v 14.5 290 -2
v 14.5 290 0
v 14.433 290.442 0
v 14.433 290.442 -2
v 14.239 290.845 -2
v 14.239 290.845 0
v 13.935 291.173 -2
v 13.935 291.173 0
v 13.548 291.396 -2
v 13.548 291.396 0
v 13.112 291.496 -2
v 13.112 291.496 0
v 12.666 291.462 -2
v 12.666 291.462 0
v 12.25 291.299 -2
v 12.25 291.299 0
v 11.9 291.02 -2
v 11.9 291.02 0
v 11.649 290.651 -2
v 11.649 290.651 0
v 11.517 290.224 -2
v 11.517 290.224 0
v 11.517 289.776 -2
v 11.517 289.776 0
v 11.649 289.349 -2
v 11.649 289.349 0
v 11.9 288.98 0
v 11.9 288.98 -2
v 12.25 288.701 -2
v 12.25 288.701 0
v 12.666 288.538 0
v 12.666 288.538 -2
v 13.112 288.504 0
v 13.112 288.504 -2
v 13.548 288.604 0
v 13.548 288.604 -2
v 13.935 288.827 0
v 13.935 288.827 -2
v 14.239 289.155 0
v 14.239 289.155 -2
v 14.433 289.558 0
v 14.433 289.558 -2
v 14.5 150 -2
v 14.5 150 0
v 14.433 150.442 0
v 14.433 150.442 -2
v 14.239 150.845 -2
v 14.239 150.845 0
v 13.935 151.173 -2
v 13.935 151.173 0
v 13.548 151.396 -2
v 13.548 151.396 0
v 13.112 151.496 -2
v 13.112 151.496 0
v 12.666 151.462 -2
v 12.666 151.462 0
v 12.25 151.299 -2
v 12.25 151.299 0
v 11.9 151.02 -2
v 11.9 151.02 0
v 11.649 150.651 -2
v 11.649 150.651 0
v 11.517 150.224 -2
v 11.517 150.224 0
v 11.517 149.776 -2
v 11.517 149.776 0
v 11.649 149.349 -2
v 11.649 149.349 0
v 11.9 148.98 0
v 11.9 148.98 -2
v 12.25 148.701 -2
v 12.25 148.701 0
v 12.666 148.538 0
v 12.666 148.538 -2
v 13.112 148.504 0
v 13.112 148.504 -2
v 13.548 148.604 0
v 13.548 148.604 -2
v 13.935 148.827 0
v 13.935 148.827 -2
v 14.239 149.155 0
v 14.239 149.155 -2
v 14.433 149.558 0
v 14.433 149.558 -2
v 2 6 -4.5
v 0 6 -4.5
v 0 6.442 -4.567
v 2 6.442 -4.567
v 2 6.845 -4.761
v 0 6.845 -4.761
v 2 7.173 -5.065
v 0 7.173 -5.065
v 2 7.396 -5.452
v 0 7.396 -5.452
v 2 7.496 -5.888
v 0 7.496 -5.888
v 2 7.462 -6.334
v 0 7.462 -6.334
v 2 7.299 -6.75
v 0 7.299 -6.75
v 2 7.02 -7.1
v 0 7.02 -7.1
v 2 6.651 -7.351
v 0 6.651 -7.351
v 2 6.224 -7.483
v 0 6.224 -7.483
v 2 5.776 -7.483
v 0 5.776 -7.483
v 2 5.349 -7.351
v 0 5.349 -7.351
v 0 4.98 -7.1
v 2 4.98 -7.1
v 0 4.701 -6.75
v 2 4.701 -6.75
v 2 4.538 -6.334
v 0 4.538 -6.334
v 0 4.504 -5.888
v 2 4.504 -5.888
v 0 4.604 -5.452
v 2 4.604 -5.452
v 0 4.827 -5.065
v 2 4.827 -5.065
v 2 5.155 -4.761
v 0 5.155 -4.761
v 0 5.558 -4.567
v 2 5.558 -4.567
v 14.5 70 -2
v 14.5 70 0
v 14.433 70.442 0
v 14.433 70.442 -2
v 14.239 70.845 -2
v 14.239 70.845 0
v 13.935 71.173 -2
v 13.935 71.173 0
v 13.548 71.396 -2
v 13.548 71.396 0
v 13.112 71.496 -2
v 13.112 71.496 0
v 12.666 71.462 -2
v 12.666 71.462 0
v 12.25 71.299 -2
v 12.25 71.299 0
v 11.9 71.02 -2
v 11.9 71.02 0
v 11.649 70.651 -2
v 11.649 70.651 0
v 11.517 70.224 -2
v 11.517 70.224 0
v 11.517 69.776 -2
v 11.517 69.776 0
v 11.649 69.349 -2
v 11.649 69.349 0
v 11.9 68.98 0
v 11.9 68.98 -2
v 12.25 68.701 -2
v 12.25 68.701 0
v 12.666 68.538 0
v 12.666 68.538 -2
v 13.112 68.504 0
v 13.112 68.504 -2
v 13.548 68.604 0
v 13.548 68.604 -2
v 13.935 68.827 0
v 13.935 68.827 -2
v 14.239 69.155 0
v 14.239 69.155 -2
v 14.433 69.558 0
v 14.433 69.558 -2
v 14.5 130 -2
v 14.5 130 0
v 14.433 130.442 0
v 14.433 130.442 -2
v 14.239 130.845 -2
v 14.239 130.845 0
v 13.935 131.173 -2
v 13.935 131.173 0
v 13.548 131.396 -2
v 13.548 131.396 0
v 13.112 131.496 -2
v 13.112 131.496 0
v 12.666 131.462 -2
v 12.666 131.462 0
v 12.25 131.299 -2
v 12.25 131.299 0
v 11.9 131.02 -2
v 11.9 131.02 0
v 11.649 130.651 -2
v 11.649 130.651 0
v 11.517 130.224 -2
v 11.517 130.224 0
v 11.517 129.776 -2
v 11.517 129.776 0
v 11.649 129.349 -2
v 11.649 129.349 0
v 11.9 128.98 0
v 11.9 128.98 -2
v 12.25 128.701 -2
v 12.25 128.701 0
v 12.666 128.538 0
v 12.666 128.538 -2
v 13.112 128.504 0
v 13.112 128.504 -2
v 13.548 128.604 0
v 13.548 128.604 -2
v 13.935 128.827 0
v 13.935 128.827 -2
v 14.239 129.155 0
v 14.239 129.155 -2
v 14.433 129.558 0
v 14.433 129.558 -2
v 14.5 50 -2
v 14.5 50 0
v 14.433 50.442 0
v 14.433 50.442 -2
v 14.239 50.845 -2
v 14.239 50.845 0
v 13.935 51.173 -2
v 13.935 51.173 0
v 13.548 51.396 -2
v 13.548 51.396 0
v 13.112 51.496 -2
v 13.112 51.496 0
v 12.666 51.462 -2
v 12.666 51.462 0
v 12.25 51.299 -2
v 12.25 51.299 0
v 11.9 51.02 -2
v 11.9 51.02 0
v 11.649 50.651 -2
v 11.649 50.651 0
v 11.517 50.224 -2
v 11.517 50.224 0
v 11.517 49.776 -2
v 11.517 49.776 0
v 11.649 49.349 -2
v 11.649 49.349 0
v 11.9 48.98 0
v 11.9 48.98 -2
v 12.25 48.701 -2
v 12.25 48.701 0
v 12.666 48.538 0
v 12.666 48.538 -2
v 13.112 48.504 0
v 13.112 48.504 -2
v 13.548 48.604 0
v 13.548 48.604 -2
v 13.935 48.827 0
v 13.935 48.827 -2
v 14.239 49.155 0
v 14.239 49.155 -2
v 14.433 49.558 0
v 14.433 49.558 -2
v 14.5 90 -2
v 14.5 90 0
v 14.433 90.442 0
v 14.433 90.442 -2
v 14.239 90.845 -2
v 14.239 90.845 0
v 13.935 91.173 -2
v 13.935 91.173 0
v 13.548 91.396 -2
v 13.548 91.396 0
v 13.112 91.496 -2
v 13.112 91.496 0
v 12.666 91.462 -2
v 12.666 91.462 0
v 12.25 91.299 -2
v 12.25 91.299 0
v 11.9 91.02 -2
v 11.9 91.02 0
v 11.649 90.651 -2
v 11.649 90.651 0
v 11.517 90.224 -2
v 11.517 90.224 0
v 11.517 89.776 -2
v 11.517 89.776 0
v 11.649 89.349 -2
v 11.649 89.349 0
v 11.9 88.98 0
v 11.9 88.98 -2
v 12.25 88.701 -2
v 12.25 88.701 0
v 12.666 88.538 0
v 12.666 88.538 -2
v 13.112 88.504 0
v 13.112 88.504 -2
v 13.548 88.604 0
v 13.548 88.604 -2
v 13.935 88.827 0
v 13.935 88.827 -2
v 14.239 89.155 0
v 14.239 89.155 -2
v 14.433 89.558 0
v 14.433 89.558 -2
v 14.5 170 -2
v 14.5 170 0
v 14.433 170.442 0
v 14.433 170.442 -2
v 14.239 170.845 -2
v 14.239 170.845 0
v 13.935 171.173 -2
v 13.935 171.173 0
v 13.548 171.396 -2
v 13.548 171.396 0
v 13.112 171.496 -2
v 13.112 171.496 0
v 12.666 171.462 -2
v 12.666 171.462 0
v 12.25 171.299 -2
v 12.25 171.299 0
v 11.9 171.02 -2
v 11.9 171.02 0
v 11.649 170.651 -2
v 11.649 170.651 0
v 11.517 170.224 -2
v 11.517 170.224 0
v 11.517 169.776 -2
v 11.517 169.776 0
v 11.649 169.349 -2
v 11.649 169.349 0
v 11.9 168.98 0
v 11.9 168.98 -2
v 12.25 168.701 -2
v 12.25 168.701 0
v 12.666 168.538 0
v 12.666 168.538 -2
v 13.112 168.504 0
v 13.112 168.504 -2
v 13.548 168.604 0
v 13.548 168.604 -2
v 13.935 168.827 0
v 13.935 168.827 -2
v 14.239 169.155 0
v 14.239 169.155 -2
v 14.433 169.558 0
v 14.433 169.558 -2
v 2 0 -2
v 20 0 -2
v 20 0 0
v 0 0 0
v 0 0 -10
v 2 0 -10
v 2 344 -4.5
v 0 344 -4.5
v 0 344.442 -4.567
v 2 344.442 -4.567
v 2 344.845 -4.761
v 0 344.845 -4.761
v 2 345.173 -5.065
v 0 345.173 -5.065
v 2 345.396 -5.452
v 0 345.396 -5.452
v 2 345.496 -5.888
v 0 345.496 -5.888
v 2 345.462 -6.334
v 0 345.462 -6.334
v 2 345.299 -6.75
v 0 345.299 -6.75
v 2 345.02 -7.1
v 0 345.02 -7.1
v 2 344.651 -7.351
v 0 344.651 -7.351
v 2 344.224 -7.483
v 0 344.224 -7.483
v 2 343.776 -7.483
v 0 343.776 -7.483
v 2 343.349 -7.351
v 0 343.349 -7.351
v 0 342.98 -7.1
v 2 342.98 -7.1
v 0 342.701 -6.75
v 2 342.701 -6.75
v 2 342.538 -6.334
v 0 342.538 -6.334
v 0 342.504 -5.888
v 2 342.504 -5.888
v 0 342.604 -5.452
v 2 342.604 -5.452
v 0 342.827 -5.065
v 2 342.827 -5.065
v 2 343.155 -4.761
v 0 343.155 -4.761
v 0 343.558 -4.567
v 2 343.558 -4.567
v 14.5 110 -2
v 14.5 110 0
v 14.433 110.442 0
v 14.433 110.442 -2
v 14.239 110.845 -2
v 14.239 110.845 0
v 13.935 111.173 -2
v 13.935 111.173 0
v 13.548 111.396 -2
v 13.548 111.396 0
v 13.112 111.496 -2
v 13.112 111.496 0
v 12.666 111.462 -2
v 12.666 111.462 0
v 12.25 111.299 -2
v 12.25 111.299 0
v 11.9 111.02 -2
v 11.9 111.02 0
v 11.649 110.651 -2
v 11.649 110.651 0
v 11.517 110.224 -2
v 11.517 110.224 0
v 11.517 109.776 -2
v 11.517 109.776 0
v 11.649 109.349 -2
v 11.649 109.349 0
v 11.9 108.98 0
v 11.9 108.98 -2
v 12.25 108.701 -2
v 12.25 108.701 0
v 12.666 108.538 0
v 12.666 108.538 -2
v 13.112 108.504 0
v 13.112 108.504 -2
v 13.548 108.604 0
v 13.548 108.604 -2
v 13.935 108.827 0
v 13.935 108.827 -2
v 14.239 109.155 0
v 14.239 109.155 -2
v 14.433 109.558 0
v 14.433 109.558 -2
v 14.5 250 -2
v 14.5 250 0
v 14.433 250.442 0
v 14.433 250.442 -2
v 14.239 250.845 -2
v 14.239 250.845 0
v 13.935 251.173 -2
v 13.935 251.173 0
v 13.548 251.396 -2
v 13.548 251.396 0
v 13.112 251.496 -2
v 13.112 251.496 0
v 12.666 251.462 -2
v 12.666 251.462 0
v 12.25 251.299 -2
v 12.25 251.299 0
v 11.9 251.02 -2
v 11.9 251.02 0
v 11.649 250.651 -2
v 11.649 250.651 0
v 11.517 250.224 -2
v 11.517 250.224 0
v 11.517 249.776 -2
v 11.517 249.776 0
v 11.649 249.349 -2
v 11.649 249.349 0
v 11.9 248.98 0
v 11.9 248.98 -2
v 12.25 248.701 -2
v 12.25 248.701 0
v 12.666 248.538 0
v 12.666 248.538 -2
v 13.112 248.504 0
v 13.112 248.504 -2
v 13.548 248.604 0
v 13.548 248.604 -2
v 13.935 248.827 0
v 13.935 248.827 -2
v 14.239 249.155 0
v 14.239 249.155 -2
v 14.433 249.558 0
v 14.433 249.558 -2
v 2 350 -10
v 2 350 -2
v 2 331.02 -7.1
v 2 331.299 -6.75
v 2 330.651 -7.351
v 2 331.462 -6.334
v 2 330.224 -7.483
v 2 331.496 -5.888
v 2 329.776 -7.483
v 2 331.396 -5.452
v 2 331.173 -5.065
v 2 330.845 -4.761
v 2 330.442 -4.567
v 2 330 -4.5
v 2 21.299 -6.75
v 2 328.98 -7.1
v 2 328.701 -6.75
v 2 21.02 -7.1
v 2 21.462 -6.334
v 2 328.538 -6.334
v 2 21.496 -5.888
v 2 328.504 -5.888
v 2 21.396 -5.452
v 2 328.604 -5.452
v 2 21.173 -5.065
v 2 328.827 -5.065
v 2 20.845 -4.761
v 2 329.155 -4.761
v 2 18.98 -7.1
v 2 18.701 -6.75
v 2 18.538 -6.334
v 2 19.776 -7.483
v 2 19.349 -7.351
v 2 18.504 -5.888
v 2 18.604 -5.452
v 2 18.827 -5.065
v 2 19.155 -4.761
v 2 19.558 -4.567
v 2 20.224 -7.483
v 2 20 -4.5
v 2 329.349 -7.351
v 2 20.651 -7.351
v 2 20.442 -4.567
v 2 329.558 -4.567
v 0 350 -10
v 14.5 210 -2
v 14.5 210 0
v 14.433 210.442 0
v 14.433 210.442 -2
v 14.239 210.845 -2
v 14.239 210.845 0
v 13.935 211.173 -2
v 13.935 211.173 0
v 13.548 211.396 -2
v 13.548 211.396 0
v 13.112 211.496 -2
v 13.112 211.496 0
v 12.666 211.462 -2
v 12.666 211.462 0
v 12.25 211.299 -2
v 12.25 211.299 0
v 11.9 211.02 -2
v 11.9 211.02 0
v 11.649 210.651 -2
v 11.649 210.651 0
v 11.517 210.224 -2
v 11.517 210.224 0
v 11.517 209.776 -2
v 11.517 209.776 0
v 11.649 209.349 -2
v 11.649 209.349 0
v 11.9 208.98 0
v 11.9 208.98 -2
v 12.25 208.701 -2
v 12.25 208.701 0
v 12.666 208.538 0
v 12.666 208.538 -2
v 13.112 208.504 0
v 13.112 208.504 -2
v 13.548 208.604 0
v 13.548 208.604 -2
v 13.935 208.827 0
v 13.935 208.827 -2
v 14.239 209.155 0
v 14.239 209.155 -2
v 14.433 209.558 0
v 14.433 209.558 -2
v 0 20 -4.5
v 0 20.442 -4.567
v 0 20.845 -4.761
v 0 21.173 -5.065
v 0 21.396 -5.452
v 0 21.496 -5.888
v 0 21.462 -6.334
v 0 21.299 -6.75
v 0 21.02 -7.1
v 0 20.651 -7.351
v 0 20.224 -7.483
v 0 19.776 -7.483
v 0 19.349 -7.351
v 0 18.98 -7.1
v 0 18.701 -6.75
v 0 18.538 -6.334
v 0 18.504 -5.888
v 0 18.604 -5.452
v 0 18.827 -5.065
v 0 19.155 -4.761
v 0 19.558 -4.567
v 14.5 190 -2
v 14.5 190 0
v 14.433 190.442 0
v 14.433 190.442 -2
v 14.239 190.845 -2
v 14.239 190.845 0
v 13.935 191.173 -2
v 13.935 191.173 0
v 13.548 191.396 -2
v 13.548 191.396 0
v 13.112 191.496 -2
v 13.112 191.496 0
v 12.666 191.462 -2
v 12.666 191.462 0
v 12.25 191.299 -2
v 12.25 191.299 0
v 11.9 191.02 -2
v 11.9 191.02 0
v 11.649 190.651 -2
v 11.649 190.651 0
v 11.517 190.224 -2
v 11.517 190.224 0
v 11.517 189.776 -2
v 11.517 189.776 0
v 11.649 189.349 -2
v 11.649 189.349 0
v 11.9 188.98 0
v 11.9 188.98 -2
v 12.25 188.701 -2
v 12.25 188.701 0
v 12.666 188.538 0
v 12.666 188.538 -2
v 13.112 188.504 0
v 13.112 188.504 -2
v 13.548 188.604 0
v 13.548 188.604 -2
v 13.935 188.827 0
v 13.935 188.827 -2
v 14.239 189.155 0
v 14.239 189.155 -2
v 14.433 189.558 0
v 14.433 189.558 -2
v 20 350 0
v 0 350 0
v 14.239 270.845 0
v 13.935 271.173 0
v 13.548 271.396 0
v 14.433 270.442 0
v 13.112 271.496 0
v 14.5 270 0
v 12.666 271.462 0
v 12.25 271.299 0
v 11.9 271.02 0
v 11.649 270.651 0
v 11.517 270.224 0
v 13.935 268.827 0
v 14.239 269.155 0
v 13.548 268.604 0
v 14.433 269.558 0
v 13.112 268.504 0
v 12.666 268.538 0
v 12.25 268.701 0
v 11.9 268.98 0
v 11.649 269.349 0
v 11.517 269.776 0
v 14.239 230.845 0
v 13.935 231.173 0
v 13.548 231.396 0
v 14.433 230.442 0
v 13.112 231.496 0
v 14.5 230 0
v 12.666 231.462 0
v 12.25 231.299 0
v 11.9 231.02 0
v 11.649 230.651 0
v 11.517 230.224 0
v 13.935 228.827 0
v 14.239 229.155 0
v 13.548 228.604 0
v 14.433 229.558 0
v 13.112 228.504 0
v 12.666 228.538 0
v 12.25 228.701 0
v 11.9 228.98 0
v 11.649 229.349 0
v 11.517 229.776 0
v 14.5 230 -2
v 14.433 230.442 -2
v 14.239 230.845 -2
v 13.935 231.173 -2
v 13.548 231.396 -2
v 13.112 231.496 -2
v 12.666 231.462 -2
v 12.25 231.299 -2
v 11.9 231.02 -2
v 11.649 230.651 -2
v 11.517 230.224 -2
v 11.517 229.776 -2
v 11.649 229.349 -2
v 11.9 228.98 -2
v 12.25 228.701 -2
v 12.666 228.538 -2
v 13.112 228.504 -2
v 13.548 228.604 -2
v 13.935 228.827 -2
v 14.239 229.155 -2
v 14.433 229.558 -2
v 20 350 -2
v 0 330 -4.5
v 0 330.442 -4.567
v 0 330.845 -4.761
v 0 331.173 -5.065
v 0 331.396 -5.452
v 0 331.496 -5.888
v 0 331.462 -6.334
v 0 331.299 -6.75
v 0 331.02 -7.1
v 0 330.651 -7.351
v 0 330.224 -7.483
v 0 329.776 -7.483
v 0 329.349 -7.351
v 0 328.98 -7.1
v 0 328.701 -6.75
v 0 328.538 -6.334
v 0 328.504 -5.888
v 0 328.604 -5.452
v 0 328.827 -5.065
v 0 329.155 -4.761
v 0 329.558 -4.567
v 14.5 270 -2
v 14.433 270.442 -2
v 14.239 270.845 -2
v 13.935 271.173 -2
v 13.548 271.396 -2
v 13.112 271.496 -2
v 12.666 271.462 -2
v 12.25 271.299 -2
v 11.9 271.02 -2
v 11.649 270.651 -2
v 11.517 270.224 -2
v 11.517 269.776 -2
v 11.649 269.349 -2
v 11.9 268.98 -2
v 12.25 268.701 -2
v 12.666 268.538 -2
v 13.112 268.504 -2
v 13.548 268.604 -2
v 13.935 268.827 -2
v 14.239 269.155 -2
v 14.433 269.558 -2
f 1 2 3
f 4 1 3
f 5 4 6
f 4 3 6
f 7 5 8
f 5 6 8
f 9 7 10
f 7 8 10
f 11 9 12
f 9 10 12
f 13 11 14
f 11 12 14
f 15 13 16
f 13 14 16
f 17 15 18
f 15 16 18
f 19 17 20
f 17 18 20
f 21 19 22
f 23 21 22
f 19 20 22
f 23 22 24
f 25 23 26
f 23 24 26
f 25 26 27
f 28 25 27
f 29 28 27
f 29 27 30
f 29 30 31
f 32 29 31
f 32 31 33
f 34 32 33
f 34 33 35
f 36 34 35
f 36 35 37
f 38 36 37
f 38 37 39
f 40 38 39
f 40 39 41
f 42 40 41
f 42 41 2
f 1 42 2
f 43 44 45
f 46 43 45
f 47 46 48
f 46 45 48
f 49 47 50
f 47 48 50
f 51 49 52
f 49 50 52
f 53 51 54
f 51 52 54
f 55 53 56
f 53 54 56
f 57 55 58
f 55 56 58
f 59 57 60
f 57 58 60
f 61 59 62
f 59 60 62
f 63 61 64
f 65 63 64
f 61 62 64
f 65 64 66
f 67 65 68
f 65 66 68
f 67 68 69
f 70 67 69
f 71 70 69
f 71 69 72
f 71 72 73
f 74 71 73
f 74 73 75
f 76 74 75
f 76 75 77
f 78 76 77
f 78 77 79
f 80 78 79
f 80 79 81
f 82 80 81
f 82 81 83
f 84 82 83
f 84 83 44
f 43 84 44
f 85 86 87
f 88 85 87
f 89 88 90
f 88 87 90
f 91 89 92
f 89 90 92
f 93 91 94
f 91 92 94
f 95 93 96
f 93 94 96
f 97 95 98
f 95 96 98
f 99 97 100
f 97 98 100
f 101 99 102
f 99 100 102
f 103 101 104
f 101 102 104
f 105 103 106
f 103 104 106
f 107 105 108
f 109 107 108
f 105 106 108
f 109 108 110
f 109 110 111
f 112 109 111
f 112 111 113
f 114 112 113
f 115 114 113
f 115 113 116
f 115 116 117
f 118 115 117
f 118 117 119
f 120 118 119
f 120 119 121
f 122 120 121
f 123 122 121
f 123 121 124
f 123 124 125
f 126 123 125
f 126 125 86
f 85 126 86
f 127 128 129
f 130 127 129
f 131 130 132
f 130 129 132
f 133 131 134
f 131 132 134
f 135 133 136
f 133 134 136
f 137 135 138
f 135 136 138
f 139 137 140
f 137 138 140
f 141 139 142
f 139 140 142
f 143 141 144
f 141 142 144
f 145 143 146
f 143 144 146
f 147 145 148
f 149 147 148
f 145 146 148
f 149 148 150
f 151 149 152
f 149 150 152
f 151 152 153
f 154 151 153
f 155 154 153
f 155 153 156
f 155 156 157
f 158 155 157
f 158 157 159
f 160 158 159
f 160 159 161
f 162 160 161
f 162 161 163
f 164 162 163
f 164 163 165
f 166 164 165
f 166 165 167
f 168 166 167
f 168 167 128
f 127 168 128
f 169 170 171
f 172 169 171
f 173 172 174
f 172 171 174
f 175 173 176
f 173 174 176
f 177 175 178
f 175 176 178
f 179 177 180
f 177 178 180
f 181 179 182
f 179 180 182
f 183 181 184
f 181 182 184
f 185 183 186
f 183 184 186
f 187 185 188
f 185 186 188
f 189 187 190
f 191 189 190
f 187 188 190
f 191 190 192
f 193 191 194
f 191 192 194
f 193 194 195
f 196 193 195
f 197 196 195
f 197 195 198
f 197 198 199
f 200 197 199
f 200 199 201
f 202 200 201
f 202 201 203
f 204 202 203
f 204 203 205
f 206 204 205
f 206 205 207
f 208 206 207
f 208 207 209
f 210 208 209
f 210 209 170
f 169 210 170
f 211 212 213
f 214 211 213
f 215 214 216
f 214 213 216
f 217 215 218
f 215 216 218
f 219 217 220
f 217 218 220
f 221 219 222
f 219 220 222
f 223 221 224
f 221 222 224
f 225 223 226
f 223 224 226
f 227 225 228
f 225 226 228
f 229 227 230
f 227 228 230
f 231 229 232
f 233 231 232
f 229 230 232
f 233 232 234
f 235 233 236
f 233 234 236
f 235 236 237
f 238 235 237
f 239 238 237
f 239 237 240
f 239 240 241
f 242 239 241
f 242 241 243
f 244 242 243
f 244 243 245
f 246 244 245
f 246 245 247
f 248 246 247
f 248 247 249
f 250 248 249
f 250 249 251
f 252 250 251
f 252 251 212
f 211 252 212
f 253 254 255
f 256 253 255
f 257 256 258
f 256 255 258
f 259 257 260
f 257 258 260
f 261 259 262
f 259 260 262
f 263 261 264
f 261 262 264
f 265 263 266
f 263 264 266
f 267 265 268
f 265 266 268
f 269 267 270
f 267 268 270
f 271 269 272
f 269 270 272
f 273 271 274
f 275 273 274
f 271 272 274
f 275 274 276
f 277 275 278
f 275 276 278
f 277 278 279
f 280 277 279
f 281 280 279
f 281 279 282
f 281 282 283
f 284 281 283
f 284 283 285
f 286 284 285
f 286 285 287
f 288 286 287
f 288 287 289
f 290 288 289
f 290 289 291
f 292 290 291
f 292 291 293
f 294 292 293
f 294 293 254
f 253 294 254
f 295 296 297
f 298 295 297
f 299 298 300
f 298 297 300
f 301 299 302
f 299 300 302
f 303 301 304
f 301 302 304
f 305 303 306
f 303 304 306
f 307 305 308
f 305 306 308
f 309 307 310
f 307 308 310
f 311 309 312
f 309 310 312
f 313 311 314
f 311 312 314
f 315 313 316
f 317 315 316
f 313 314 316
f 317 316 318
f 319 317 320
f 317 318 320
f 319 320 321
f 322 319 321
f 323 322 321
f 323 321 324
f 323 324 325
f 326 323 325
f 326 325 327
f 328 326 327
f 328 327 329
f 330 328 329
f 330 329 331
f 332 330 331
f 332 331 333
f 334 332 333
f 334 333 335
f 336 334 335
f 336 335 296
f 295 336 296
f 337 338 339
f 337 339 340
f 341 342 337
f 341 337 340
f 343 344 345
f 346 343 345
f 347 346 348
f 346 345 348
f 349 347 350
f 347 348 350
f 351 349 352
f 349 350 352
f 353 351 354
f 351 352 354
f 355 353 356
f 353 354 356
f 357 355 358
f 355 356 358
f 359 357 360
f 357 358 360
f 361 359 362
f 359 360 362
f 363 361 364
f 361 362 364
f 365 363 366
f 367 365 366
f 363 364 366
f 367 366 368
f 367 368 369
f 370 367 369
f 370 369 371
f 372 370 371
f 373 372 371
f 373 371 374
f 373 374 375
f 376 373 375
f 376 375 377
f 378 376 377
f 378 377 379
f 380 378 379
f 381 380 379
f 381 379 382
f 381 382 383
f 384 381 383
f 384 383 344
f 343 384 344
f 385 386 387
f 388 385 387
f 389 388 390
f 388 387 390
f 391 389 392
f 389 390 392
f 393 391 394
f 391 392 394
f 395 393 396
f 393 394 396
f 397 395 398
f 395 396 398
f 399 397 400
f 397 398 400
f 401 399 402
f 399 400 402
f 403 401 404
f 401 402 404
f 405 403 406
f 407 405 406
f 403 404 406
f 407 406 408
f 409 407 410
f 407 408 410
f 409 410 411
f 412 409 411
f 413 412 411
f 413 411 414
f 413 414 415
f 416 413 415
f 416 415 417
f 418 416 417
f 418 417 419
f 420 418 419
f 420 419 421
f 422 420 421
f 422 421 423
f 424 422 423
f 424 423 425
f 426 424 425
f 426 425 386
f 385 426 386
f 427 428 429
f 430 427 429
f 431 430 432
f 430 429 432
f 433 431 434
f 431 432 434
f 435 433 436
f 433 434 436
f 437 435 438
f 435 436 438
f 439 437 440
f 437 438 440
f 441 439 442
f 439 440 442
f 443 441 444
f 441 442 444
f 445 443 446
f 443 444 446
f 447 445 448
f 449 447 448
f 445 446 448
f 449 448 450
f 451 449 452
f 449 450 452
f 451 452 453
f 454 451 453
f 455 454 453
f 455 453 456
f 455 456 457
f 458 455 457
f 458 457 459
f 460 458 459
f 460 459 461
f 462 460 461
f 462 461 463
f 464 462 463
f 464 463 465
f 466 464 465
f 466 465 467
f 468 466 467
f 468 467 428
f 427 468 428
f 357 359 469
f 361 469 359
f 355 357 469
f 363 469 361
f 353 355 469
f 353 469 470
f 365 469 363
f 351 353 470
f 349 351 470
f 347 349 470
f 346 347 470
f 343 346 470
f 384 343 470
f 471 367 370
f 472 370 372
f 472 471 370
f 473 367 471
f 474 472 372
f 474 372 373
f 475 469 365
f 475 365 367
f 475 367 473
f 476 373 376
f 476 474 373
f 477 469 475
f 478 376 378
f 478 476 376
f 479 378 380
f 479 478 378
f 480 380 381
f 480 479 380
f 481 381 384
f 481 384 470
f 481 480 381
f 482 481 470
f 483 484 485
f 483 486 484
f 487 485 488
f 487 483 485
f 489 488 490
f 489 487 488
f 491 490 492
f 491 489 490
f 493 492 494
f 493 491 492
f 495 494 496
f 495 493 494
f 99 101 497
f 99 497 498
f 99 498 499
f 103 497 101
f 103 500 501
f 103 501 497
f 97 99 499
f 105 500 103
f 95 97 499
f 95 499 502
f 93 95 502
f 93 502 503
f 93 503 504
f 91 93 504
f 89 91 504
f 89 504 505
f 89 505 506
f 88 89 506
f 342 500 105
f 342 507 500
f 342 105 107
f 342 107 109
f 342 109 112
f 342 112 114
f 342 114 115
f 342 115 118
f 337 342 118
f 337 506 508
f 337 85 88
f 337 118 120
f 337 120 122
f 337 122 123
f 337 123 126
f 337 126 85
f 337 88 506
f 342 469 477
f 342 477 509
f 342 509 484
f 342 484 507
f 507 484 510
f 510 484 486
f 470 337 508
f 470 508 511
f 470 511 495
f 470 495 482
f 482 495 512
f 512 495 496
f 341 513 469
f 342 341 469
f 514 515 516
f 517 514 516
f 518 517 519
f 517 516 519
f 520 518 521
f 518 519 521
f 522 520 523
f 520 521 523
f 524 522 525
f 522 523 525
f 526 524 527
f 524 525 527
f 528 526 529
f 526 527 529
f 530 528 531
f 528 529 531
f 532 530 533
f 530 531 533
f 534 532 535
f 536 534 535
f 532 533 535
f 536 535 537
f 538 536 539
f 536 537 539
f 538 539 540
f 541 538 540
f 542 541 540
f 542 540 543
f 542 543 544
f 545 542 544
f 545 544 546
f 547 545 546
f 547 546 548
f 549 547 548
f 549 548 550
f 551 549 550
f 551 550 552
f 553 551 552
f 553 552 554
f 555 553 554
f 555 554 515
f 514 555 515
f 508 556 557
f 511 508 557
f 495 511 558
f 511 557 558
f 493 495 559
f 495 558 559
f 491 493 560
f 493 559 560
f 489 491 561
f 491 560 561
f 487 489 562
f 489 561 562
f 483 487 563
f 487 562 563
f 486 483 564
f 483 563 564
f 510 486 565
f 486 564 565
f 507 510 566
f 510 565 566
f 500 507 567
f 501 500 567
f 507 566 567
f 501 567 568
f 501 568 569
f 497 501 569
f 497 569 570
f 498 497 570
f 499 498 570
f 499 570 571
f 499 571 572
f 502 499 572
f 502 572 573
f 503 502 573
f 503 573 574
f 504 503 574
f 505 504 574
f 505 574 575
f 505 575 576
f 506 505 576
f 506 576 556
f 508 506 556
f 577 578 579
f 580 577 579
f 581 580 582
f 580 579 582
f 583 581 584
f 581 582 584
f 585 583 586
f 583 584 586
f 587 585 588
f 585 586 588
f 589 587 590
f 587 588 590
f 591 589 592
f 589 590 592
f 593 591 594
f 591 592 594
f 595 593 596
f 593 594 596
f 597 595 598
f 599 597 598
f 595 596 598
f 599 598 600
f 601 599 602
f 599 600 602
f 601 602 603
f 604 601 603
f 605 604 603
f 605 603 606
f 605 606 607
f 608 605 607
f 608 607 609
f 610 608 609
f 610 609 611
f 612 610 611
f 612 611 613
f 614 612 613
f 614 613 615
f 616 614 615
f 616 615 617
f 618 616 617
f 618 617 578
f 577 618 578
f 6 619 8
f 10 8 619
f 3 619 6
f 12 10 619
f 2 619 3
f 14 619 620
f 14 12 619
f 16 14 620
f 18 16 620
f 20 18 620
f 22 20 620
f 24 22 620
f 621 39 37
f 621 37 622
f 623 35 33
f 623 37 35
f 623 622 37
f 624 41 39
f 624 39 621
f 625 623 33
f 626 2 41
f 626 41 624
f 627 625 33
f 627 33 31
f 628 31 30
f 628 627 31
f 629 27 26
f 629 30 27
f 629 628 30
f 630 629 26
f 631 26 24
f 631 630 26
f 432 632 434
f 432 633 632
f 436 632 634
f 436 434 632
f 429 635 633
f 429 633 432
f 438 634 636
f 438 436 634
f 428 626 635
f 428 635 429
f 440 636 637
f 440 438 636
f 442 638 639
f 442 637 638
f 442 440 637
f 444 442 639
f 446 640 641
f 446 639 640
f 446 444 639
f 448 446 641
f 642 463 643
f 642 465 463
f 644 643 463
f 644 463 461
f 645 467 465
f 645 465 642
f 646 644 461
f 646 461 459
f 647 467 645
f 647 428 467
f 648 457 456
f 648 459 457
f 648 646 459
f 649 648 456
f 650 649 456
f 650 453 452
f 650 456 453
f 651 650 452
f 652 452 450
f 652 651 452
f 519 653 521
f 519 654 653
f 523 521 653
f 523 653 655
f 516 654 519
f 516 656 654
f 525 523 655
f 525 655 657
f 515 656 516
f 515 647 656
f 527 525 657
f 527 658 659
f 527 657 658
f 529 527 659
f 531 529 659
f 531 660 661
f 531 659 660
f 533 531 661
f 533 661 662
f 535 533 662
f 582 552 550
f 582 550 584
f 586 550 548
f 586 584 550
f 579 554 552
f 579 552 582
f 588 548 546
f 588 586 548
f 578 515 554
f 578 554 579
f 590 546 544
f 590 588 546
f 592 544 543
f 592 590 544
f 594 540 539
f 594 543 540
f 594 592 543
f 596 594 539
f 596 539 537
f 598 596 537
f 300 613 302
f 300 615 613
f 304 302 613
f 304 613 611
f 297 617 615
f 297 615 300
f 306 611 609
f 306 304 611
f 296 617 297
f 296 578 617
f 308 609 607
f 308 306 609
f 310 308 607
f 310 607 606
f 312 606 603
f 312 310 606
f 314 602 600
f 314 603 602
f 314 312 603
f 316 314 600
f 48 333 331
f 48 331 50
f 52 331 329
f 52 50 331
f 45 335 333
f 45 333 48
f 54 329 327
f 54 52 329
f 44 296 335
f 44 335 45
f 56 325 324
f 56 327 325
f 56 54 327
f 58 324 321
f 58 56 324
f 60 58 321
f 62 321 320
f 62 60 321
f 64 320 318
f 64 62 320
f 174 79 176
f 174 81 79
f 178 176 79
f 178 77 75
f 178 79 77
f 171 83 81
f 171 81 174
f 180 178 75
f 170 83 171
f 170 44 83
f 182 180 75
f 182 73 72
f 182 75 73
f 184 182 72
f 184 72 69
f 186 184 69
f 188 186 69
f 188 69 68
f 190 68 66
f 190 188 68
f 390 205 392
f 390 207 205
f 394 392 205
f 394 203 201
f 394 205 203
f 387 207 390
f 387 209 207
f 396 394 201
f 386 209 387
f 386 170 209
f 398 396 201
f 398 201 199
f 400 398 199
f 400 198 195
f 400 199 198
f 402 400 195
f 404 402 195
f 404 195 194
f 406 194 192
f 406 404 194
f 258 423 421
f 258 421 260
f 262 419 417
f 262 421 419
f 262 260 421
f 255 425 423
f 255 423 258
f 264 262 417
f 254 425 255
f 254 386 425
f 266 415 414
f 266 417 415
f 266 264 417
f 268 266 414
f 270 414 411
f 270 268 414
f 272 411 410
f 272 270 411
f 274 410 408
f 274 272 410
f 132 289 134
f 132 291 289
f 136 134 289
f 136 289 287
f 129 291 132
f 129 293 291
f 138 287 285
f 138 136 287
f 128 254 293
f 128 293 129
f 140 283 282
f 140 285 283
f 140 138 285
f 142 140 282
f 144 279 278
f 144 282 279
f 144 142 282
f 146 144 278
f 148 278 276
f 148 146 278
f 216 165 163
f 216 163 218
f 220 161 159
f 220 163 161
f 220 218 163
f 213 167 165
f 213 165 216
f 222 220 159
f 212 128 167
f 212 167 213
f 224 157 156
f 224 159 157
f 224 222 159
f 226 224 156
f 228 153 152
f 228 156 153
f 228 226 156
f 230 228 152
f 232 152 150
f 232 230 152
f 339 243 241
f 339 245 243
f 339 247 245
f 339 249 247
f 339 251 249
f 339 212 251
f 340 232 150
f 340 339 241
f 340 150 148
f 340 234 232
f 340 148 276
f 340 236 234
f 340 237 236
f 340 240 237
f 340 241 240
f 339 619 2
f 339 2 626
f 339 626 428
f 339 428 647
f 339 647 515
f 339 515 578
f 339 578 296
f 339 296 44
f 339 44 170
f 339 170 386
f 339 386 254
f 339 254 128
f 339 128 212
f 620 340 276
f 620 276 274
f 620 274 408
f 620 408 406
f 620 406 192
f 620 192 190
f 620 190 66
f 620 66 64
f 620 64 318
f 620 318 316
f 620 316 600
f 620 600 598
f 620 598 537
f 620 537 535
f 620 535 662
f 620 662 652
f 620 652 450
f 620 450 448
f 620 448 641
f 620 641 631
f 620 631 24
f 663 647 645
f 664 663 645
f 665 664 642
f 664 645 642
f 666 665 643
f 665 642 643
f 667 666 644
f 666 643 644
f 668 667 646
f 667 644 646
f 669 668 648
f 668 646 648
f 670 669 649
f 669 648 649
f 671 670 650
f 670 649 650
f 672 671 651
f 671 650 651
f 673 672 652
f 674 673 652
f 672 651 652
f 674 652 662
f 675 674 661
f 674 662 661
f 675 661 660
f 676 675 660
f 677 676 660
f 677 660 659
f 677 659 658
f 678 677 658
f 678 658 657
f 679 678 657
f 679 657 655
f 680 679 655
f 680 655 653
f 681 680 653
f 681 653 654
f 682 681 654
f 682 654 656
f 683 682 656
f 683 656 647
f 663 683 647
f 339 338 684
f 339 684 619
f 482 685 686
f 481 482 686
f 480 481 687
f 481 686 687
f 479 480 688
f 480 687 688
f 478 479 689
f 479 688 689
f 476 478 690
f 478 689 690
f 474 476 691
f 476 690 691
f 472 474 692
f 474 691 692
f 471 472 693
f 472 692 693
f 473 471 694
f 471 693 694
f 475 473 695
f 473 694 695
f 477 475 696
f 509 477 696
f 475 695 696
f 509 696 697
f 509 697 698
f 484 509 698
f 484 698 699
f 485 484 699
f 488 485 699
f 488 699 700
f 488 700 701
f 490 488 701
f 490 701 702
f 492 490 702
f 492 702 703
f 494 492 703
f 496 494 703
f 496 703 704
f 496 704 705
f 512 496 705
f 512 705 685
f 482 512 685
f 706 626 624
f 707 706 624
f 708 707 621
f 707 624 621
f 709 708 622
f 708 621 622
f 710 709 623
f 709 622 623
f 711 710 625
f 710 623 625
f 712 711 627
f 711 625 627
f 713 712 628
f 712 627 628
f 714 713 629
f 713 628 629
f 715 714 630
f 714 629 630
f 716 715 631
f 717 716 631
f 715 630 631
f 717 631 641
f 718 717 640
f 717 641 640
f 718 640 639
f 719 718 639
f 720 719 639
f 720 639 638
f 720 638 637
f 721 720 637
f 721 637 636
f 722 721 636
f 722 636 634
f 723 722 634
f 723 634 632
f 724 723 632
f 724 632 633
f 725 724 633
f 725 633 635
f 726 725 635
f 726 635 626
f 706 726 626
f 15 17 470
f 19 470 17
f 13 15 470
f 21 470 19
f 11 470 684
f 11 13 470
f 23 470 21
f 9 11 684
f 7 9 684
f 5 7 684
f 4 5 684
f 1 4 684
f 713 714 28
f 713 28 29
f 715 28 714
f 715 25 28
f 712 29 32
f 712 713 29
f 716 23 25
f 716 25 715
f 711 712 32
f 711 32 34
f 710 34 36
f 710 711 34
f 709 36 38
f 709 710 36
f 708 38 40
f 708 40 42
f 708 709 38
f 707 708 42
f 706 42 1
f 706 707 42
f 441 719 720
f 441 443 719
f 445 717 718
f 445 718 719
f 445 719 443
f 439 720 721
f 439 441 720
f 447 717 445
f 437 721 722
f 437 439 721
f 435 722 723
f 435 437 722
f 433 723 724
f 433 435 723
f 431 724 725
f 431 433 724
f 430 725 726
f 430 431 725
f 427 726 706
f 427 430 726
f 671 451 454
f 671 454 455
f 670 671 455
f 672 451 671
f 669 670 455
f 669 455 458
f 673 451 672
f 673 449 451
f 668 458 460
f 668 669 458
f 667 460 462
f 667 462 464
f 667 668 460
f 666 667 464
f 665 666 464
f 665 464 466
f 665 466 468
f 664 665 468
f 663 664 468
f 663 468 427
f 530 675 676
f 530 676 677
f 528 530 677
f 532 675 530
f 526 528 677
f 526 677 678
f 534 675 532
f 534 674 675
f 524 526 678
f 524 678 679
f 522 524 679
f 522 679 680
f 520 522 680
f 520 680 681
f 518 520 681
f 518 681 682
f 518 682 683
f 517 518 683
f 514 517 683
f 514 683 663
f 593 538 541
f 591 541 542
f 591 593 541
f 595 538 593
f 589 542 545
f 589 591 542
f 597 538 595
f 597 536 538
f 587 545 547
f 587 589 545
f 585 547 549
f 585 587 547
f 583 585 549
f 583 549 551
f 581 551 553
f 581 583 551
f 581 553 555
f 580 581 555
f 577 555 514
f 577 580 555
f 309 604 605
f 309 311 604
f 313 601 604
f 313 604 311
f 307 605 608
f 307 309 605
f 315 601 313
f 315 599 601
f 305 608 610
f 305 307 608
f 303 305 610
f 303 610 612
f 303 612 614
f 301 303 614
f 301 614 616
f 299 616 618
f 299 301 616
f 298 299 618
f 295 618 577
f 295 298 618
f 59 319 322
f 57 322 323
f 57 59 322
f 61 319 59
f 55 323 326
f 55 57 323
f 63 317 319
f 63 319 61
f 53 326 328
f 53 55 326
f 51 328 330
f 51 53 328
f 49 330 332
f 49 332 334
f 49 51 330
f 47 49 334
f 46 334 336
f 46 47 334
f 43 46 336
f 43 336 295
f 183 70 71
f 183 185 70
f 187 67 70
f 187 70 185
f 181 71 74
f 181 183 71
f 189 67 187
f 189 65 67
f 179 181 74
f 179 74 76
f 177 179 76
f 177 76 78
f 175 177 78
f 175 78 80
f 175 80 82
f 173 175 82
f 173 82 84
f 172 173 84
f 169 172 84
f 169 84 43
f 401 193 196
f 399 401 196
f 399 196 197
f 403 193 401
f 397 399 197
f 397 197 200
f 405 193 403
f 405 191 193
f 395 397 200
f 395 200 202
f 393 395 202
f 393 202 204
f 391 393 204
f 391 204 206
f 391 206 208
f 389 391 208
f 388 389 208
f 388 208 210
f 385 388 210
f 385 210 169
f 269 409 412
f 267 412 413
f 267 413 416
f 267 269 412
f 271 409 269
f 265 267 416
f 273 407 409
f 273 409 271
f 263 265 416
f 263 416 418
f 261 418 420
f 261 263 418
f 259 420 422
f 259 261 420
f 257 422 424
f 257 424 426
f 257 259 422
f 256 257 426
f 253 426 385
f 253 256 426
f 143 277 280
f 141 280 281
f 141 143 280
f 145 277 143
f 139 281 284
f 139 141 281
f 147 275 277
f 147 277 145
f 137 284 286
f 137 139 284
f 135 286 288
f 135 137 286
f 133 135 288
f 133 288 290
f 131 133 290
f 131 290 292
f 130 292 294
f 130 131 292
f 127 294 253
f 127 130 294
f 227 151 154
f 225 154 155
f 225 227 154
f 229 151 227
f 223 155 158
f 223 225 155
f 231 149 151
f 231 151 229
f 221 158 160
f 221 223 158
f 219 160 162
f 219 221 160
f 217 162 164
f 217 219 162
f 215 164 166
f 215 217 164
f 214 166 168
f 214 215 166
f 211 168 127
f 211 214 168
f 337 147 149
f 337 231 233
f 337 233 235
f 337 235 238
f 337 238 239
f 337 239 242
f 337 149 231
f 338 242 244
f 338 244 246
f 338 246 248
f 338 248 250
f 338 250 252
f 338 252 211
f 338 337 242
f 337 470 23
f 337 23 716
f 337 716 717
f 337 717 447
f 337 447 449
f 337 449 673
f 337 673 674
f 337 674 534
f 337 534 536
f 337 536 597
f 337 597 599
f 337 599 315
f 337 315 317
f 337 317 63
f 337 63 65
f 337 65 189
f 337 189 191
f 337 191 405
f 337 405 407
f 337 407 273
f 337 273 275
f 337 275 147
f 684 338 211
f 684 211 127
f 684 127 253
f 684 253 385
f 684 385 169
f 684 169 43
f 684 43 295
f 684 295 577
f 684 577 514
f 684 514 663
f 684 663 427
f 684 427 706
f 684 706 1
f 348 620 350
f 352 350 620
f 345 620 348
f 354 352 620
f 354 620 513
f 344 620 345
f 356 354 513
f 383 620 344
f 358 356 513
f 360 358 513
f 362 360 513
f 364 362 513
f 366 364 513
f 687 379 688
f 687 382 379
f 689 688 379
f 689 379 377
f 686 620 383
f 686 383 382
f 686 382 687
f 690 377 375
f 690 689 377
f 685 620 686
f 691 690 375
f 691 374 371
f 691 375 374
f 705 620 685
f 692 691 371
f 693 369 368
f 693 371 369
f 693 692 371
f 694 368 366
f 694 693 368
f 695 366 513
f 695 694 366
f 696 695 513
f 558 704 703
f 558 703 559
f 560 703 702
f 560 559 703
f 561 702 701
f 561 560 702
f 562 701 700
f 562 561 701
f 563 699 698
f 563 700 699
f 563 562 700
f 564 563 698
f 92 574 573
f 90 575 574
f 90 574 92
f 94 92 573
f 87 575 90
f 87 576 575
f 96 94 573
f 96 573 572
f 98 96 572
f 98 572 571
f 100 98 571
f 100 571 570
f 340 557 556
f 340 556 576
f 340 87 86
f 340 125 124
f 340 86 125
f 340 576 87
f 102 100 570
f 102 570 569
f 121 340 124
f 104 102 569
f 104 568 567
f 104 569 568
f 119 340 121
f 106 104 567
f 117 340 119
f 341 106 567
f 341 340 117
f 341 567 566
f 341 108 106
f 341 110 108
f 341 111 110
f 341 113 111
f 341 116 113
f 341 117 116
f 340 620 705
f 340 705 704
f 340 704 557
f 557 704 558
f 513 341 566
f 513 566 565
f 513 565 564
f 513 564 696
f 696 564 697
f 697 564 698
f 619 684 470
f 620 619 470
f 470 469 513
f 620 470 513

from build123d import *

# Parameters (mm, degrees)
BOSS_EXTRUDE1_DEPTH      = 350
F_3_0_3_DIAMETER_HOLE1_D = 3
F_3_0_3_DIAMETER_HOLE2_D = 3
SKETCH6_R                = 1.5
CUT_EXTRUDE1_DEPTH       = 351.713558335


with BuildPart() as part:
    # Sketch1 → Boss-Extrude1 (new body)
    with BuildSketch(Plane(origin=(0, 0, 0), x_dir=(1, 0, 0), z_dir=(0, 1, 0))):
        Polygon((0, 0), (0, 10), (2, 10), (2, 2), (20, 2), (20, 0), align=None)
    extrude(amount=BOSS_EXTRUDE1_DEPTH)

    # Ø3.0 (3) Diameter Hole1 (through all)
    with Locations(Plane(origin=(2, -11.407632793, -188.67995168), x_dir=(0, 0, -1), z_dir=(1, 0, 0))):
        with Locations((-182.67995168, 17.407632793), (-182.67995168, 31.407632793)):
            Hole(F_3_0_3_DIAMETER_HOLE1_D / 2)

    # Ø3.0 (3) Diameter Hole2 (through all)
    with Locations(Plane(origin=(2, -11.407632793, -188.67995168), x_dir=(0, 0, -1), z_dir=(1, 0, 0))):
        with Locations((-182.67995168, 355.407632793), (-182.67995168, 341.407632793)):
            Hole(F_3_0_3_DIAMETER_HOLE2_D / 2)

    # Sketch6 → Cut-Extrude1 (cut, through all)
    with BuildSketch(Plane.XY):
        with Locations((12.999999986, 290)):
            Circle(SKETCH6_R)
        with Locations((12.999999986, 270)):
            Circle(SKETCH6_R)
        with Locations((12.999999986, 250)):
            Circle(SKETCH6_R)
        with Locations((12.999999986, 230)):
            Circle(SKETCH6_R)
        with Locations((12.999999986, 210)):
            Circle(SKETCH6_R)
        with Locations((12.999999986, 190)):
            Circle(SKETCH6_R)
        with Locations((12.999999986, 170)):
            Circle(SKETCH6_R)
        with Locations((12.999999986, 150)):
            Circle(SKETCH6_R)
        with Locations((12.999999986, 130)):
            Circle(SKETCH6_R)
        with Locations((12.999999986, 110)):
            Circle(SKETCH6_R)
        with Locations((12.999999986, 90)):
            Circle(SKETCH6_R)
        with Locations((12.999999986, 70)):
            Circle(SKETCH6_R)
        with Locations((12.999999986, 50)):
            Circle(SKETCH6_R)
    extrude(amount=-CUT_EXTRUDE1_DEPTH, mode=Mode.SUBTRACT)


solid = part.part
